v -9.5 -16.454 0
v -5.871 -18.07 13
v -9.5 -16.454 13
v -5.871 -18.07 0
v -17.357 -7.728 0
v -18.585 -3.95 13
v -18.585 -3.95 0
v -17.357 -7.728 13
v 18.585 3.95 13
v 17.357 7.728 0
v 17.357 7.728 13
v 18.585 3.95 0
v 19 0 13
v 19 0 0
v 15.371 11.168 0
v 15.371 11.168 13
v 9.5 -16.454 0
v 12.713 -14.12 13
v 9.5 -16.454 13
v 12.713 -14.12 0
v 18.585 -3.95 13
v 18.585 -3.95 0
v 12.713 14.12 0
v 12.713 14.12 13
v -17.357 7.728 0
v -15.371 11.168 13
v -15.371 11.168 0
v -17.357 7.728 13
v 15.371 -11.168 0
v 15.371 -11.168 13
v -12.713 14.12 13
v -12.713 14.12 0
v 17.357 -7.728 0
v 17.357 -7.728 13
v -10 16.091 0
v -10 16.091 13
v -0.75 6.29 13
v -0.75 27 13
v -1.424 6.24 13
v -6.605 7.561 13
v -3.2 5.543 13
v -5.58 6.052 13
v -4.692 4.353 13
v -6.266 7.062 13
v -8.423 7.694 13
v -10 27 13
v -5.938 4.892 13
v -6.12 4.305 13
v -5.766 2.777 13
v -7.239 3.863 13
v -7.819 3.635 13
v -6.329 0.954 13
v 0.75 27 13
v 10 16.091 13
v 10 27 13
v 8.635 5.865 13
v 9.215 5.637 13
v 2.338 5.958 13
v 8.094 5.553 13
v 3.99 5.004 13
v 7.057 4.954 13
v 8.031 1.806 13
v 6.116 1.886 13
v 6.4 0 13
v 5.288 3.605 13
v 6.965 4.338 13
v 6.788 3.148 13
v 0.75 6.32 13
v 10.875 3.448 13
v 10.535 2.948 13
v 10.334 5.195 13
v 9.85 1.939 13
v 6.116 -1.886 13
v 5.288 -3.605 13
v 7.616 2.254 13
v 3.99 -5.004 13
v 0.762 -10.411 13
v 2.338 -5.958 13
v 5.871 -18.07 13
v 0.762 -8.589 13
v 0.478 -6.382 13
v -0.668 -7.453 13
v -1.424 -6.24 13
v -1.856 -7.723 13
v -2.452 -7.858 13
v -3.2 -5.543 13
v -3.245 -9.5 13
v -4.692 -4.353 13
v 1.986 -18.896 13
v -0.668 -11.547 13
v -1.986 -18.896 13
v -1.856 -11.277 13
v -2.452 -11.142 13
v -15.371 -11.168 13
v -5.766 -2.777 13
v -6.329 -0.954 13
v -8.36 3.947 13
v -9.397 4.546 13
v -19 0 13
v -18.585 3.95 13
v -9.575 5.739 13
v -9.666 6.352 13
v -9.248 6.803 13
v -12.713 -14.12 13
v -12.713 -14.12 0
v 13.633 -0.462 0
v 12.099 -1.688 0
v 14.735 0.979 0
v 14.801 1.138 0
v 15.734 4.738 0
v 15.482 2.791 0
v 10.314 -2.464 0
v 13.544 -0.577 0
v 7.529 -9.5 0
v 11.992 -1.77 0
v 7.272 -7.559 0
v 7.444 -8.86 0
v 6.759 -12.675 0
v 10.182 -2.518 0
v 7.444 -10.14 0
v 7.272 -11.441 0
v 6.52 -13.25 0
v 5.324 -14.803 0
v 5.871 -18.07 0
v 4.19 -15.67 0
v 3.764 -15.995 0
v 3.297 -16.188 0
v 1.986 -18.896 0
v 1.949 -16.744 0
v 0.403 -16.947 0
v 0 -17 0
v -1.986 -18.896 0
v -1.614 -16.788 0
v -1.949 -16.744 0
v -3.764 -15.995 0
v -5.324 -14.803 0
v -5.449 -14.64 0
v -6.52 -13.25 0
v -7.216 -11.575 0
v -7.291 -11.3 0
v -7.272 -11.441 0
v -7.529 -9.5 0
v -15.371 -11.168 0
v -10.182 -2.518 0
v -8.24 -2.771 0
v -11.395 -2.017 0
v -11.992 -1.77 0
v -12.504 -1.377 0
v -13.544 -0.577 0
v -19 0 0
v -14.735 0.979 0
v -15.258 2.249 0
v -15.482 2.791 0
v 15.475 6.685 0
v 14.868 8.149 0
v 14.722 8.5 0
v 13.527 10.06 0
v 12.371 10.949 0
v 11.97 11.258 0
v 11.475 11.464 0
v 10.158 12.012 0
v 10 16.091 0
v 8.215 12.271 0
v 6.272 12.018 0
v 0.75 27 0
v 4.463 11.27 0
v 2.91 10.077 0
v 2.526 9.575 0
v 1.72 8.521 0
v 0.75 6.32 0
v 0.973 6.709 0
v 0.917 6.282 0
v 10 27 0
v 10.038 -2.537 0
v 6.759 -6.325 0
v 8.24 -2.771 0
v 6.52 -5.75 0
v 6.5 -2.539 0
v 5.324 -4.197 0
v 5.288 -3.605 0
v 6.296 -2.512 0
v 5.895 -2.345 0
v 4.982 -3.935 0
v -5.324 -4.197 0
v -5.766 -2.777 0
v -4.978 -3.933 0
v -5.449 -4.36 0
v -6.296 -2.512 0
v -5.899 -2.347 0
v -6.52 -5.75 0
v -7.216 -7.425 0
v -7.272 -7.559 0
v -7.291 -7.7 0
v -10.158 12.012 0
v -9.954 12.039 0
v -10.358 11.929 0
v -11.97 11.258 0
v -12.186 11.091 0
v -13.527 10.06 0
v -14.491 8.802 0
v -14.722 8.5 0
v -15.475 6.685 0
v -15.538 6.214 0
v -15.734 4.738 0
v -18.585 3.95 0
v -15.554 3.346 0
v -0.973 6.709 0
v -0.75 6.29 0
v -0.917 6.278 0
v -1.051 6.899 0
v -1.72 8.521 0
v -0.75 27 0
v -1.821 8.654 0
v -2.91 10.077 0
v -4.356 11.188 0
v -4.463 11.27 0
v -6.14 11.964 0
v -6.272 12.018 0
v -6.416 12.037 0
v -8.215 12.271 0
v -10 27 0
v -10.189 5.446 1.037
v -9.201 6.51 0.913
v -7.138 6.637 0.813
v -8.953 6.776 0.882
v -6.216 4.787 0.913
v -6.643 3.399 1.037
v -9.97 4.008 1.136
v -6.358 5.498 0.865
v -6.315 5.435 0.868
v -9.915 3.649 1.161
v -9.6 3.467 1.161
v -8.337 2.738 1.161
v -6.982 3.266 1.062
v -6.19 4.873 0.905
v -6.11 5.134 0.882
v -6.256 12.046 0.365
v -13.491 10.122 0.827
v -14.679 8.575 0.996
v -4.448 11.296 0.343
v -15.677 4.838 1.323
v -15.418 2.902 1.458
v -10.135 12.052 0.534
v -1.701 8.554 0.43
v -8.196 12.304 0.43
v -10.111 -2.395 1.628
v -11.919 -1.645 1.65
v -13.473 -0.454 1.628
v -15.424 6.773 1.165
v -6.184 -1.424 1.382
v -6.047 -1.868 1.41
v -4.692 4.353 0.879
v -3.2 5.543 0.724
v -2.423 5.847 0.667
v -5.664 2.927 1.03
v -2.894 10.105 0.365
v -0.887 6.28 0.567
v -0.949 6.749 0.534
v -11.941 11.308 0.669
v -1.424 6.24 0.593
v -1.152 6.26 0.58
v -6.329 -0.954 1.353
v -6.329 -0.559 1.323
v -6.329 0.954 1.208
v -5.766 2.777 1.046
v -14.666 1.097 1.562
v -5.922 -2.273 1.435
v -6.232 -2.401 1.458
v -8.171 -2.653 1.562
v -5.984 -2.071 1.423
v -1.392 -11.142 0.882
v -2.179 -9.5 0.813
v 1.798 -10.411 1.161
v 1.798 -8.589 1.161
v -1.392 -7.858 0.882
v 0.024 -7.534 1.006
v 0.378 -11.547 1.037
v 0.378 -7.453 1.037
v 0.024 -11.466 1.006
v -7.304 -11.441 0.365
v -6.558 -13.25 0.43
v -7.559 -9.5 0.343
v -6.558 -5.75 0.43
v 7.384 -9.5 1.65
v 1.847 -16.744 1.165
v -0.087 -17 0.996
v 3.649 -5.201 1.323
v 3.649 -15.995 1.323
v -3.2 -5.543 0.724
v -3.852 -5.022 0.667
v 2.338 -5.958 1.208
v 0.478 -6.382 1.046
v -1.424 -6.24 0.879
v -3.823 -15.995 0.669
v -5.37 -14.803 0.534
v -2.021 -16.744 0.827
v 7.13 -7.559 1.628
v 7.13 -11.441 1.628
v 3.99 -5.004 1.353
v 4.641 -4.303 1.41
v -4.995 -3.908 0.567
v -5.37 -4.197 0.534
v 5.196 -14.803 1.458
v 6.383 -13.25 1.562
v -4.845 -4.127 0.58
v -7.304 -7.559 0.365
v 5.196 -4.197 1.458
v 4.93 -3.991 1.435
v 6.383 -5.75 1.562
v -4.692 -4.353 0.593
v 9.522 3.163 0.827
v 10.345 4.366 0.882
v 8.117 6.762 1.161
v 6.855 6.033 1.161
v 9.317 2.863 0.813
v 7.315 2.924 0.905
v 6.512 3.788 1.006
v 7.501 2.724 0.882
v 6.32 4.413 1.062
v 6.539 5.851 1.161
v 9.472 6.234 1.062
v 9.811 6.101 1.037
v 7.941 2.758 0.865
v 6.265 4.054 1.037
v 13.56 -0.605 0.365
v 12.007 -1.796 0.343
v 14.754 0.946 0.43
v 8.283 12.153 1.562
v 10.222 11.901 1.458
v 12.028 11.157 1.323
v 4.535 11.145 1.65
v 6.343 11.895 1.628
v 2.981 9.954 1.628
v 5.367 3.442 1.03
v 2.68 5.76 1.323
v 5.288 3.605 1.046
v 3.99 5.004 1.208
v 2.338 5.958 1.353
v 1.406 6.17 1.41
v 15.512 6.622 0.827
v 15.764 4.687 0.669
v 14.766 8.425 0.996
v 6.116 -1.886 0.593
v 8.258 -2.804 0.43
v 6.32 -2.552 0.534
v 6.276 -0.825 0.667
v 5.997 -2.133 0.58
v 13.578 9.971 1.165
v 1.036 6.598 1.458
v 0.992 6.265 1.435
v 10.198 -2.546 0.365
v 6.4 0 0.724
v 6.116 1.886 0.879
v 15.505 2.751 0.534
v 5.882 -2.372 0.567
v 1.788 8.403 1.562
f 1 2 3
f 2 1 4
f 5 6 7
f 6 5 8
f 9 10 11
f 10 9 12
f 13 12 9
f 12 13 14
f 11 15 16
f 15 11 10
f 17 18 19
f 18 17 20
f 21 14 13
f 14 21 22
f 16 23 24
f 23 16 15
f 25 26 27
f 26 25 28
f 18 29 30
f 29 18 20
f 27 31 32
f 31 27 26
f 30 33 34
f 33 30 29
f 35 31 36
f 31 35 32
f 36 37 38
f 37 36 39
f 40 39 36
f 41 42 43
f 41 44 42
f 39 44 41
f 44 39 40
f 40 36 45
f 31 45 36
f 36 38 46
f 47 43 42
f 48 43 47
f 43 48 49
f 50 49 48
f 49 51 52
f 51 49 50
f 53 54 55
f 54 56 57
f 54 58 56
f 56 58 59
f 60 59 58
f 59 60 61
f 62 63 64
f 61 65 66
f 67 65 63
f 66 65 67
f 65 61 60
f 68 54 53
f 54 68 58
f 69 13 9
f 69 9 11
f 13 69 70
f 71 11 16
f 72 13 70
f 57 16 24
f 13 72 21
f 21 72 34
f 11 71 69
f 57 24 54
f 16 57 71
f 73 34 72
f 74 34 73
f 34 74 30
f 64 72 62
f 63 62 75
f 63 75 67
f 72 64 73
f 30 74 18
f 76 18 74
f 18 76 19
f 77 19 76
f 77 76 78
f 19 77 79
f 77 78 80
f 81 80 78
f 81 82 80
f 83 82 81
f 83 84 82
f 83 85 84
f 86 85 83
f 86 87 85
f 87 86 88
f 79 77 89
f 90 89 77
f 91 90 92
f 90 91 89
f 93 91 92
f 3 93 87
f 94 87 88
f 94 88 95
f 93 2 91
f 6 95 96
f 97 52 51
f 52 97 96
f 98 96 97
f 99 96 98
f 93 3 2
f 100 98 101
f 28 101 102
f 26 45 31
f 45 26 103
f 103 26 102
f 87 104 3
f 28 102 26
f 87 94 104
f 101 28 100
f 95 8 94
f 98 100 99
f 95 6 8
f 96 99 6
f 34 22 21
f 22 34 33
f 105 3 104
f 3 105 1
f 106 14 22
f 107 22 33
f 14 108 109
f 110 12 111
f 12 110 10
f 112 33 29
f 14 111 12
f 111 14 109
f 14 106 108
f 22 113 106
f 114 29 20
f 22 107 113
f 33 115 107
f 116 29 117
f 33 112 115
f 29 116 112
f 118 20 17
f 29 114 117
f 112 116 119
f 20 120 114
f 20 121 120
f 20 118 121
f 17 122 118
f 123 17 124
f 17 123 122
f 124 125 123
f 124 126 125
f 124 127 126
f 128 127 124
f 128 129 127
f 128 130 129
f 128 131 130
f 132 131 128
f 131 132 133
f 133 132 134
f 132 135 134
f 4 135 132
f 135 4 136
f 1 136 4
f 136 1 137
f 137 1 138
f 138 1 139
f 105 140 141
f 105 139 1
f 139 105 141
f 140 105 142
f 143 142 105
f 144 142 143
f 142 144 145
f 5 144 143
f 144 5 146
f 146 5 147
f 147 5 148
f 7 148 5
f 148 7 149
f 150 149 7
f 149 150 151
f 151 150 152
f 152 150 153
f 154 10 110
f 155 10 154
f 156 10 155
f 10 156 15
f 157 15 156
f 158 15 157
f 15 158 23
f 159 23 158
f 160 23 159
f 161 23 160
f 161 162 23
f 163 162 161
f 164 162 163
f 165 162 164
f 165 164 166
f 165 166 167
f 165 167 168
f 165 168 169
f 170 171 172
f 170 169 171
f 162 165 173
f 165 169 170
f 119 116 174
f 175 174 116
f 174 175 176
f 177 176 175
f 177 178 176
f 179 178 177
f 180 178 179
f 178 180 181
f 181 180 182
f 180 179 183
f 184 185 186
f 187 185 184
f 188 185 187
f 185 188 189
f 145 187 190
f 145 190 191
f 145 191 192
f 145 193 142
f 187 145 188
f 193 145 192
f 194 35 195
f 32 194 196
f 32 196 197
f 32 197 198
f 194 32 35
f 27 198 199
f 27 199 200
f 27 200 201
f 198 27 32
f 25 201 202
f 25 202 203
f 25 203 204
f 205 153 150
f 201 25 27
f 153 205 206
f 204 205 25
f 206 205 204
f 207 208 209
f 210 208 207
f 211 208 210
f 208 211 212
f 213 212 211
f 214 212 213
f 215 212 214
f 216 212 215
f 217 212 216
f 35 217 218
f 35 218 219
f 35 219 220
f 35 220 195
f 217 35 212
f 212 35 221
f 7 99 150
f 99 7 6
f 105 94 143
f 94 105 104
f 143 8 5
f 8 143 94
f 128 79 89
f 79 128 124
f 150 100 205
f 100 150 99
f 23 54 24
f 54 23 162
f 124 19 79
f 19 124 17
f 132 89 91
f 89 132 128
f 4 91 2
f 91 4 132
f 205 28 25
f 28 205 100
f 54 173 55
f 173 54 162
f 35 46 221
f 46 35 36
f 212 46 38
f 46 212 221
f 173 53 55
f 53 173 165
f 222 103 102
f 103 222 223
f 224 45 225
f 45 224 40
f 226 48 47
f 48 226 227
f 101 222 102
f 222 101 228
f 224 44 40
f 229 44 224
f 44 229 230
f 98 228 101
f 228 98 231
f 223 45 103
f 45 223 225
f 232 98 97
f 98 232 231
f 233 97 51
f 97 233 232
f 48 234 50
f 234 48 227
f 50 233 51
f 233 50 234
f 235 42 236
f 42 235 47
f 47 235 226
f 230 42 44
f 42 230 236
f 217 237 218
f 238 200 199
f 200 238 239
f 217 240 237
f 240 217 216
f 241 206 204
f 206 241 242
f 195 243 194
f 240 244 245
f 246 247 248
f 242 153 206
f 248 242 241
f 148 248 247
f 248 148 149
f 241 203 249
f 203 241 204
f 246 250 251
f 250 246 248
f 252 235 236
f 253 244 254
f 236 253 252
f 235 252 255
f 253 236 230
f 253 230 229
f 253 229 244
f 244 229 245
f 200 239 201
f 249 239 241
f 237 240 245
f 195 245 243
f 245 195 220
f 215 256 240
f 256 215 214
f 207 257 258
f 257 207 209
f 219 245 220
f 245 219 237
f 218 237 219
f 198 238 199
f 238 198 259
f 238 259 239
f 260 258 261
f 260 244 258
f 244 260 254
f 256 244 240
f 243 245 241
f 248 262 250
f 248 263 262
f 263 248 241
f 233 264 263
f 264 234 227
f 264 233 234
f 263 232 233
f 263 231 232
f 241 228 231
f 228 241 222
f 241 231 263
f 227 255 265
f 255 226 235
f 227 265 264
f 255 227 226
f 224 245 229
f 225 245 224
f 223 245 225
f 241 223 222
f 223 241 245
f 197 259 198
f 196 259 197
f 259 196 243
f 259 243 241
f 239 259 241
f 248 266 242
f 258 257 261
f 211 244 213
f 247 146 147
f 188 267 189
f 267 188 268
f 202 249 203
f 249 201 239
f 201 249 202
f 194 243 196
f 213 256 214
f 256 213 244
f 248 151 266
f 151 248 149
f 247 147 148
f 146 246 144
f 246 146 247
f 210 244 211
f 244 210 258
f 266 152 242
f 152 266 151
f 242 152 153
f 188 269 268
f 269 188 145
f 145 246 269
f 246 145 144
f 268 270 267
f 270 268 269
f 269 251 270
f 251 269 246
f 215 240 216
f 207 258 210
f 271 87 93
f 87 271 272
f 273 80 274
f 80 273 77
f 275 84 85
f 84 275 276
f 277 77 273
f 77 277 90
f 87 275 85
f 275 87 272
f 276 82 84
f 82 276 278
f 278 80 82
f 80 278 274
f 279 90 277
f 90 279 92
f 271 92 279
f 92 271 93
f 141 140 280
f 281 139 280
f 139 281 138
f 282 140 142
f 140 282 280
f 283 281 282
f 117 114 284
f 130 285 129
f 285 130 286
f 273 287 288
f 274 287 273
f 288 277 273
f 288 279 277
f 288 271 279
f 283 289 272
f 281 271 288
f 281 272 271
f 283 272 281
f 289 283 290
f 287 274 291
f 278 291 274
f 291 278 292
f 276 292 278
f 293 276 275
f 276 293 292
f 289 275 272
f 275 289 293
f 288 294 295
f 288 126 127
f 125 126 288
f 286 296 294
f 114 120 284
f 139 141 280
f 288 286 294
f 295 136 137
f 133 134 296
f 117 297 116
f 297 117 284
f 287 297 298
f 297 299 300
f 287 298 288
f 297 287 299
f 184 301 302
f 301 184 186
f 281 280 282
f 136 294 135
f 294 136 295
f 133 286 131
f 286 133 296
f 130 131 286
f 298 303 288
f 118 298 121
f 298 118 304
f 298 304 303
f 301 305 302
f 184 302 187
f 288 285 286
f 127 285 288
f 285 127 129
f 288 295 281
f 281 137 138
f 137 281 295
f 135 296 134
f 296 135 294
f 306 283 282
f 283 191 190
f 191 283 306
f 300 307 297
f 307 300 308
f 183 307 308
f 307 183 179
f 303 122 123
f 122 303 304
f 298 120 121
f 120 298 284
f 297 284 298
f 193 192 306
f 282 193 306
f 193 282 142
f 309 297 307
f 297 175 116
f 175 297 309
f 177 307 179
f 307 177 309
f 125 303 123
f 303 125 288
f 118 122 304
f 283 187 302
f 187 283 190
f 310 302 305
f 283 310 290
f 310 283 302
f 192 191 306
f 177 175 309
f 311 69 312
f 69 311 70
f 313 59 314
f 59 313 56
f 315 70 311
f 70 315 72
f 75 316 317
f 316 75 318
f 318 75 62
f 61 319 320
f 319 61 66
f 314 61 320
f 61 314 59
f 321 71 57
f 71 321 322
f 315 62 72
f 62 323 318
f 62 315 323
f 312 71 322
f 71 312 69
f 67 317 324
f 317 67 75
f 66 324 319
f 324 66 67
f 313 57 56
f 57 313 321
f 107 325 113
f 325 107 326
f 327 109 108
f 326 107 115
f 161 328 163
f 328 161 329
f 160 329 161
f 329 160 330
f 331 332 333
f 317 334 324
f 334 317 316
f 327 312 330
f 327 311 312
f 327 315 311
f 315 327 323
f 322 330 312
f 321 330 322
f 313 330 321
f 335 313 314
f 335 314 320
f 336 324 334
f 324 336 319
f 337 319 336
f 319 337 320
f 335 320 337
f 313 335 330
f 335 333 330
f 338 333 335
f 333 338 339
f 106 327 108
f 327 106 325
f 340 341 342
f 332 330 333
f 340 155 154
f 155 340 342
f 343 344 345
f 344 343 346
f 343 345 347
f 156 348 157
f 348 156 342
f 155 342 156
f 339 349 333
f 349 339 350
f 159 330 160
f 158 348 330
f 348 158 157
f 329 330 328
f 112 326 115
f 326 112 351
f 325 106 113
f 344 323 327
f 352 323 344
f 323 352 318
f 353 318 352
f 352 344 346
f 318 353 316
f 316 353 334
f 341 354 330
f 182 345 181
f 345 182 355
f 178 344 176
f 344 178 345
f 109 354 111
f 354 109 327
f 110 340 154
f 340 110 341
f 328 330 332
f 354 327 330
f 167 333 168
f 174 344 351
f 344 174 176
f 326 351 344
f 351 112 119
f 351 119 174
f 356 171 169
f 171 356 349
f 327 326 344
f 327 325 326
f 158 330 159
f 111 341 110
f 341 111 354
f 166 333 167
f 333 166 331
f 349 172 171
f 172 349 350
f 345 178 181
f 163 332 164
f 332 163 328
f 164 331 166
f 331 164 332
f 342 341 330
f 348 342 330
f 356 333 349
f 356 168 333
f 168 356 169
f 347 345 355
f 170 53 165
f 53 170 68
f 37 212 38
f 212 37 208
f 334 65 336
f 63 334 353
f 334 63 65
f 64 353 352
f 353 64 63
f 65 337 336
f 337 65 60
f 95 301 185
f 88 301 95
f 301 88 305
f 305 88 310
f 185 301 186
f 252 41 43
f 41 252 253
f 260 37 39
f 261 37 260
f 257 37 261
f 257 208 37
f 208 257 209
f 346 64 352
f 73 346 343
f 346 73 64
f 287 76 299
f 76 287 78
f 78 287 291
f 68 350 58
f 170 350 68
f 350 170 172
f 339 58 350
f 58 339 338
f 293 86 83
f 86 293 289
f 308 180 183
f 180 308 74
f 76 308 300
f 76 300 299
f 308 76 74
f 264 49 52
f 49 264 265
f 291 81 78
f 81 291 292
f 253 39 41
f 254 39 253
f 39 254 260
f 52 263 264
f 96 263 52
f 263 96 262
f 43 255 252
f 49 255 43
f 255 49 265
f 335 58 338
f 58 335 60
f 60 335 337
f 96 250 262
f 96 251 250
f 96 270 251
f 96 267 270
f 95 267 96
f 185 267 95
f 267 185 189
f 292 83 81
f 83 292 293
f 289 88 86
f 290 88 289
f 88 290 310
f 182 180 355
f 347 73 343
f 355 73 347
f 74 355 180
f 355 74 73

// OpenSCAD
// file: configuration.scad
LMxUU = 8;				// Choose linear bearing: 8 or 12mm
rodspacing = 175;		// Distance between rods:	175 standard, 190 wide
PVC_pipe_OD = 32;		// Default 32mm
PVC_pipe_ID = 26;	// measure pipe ID to adjust
Drive_pipe_OD = 22;	// Drive pipe outter diameter: 22mm default
THREADLESS = true;	// True for use of threadless ball screw in z-bracket
SUPPORTED_ROD = true;	// Rods held by Z-mounts - False for platform mounted (lasercut)
Leadnut_thread = false;// Apply the thread of the leadscrew nut to the Z coupler

ENVELOPE_CHECK = false;

m3_dia = 3.2;
m3_nut_dia = 6.8;
m3_nut_slot = 5.8;
m3_nut_height = 3;

m4_dia = 4.2;
m4_nut_dia = 8.8;
m4_nut_height = 3.8;

m8_dia = 8.2;
m8_nut_dia = 16.5;
m8_nut_height = 6.8;

print_layer_height = 0.25;
// main file
include <configuration.scad>

axis_dia = 8;
bearing_od=13;
bearing_id=4;
bearing_h=5;


module BallScrewBase() {
    height=13;
    clamp_width = 20;
    clamp_length = 27;
    clamp_split = 1.5;
    mount_dia = 38;
    tension_distance = 1;
    
    thread_angle = 5;
    
    difference() {
        union() {
            // body
            cylinder(d=mount_dia, h=height);
            // clamp
            translate([-clamp_width/2,0,0])cube(size=[clamp_width, clamp_length, height]);
        }
        // Split
        translate([-clamp_split/2,0,0])cube(size=[clamp_split, clamp_length, height]);
        // Space for axis
        cylinder(d=axis_dia*1.6, h=height);
        for (a=[60:120:360]) {
            // screw holes
            rotate([0,thread_angle,a])translate([0,(axis_dia + bearing_od)/2 - tension_distance, -m4_dia ])cylinder(d=m4_dia, h=height*2);
            // bearing holes
            rotate([0,thread_angle,a])translate([0,(axis_dia + bearing_od)/2 - tension_distance, -bearing_h+1 ])cylinder(d=bearing_od + 2, h=bearing_h);
            
        }
        
    }
        
}

BallScrewBase();
